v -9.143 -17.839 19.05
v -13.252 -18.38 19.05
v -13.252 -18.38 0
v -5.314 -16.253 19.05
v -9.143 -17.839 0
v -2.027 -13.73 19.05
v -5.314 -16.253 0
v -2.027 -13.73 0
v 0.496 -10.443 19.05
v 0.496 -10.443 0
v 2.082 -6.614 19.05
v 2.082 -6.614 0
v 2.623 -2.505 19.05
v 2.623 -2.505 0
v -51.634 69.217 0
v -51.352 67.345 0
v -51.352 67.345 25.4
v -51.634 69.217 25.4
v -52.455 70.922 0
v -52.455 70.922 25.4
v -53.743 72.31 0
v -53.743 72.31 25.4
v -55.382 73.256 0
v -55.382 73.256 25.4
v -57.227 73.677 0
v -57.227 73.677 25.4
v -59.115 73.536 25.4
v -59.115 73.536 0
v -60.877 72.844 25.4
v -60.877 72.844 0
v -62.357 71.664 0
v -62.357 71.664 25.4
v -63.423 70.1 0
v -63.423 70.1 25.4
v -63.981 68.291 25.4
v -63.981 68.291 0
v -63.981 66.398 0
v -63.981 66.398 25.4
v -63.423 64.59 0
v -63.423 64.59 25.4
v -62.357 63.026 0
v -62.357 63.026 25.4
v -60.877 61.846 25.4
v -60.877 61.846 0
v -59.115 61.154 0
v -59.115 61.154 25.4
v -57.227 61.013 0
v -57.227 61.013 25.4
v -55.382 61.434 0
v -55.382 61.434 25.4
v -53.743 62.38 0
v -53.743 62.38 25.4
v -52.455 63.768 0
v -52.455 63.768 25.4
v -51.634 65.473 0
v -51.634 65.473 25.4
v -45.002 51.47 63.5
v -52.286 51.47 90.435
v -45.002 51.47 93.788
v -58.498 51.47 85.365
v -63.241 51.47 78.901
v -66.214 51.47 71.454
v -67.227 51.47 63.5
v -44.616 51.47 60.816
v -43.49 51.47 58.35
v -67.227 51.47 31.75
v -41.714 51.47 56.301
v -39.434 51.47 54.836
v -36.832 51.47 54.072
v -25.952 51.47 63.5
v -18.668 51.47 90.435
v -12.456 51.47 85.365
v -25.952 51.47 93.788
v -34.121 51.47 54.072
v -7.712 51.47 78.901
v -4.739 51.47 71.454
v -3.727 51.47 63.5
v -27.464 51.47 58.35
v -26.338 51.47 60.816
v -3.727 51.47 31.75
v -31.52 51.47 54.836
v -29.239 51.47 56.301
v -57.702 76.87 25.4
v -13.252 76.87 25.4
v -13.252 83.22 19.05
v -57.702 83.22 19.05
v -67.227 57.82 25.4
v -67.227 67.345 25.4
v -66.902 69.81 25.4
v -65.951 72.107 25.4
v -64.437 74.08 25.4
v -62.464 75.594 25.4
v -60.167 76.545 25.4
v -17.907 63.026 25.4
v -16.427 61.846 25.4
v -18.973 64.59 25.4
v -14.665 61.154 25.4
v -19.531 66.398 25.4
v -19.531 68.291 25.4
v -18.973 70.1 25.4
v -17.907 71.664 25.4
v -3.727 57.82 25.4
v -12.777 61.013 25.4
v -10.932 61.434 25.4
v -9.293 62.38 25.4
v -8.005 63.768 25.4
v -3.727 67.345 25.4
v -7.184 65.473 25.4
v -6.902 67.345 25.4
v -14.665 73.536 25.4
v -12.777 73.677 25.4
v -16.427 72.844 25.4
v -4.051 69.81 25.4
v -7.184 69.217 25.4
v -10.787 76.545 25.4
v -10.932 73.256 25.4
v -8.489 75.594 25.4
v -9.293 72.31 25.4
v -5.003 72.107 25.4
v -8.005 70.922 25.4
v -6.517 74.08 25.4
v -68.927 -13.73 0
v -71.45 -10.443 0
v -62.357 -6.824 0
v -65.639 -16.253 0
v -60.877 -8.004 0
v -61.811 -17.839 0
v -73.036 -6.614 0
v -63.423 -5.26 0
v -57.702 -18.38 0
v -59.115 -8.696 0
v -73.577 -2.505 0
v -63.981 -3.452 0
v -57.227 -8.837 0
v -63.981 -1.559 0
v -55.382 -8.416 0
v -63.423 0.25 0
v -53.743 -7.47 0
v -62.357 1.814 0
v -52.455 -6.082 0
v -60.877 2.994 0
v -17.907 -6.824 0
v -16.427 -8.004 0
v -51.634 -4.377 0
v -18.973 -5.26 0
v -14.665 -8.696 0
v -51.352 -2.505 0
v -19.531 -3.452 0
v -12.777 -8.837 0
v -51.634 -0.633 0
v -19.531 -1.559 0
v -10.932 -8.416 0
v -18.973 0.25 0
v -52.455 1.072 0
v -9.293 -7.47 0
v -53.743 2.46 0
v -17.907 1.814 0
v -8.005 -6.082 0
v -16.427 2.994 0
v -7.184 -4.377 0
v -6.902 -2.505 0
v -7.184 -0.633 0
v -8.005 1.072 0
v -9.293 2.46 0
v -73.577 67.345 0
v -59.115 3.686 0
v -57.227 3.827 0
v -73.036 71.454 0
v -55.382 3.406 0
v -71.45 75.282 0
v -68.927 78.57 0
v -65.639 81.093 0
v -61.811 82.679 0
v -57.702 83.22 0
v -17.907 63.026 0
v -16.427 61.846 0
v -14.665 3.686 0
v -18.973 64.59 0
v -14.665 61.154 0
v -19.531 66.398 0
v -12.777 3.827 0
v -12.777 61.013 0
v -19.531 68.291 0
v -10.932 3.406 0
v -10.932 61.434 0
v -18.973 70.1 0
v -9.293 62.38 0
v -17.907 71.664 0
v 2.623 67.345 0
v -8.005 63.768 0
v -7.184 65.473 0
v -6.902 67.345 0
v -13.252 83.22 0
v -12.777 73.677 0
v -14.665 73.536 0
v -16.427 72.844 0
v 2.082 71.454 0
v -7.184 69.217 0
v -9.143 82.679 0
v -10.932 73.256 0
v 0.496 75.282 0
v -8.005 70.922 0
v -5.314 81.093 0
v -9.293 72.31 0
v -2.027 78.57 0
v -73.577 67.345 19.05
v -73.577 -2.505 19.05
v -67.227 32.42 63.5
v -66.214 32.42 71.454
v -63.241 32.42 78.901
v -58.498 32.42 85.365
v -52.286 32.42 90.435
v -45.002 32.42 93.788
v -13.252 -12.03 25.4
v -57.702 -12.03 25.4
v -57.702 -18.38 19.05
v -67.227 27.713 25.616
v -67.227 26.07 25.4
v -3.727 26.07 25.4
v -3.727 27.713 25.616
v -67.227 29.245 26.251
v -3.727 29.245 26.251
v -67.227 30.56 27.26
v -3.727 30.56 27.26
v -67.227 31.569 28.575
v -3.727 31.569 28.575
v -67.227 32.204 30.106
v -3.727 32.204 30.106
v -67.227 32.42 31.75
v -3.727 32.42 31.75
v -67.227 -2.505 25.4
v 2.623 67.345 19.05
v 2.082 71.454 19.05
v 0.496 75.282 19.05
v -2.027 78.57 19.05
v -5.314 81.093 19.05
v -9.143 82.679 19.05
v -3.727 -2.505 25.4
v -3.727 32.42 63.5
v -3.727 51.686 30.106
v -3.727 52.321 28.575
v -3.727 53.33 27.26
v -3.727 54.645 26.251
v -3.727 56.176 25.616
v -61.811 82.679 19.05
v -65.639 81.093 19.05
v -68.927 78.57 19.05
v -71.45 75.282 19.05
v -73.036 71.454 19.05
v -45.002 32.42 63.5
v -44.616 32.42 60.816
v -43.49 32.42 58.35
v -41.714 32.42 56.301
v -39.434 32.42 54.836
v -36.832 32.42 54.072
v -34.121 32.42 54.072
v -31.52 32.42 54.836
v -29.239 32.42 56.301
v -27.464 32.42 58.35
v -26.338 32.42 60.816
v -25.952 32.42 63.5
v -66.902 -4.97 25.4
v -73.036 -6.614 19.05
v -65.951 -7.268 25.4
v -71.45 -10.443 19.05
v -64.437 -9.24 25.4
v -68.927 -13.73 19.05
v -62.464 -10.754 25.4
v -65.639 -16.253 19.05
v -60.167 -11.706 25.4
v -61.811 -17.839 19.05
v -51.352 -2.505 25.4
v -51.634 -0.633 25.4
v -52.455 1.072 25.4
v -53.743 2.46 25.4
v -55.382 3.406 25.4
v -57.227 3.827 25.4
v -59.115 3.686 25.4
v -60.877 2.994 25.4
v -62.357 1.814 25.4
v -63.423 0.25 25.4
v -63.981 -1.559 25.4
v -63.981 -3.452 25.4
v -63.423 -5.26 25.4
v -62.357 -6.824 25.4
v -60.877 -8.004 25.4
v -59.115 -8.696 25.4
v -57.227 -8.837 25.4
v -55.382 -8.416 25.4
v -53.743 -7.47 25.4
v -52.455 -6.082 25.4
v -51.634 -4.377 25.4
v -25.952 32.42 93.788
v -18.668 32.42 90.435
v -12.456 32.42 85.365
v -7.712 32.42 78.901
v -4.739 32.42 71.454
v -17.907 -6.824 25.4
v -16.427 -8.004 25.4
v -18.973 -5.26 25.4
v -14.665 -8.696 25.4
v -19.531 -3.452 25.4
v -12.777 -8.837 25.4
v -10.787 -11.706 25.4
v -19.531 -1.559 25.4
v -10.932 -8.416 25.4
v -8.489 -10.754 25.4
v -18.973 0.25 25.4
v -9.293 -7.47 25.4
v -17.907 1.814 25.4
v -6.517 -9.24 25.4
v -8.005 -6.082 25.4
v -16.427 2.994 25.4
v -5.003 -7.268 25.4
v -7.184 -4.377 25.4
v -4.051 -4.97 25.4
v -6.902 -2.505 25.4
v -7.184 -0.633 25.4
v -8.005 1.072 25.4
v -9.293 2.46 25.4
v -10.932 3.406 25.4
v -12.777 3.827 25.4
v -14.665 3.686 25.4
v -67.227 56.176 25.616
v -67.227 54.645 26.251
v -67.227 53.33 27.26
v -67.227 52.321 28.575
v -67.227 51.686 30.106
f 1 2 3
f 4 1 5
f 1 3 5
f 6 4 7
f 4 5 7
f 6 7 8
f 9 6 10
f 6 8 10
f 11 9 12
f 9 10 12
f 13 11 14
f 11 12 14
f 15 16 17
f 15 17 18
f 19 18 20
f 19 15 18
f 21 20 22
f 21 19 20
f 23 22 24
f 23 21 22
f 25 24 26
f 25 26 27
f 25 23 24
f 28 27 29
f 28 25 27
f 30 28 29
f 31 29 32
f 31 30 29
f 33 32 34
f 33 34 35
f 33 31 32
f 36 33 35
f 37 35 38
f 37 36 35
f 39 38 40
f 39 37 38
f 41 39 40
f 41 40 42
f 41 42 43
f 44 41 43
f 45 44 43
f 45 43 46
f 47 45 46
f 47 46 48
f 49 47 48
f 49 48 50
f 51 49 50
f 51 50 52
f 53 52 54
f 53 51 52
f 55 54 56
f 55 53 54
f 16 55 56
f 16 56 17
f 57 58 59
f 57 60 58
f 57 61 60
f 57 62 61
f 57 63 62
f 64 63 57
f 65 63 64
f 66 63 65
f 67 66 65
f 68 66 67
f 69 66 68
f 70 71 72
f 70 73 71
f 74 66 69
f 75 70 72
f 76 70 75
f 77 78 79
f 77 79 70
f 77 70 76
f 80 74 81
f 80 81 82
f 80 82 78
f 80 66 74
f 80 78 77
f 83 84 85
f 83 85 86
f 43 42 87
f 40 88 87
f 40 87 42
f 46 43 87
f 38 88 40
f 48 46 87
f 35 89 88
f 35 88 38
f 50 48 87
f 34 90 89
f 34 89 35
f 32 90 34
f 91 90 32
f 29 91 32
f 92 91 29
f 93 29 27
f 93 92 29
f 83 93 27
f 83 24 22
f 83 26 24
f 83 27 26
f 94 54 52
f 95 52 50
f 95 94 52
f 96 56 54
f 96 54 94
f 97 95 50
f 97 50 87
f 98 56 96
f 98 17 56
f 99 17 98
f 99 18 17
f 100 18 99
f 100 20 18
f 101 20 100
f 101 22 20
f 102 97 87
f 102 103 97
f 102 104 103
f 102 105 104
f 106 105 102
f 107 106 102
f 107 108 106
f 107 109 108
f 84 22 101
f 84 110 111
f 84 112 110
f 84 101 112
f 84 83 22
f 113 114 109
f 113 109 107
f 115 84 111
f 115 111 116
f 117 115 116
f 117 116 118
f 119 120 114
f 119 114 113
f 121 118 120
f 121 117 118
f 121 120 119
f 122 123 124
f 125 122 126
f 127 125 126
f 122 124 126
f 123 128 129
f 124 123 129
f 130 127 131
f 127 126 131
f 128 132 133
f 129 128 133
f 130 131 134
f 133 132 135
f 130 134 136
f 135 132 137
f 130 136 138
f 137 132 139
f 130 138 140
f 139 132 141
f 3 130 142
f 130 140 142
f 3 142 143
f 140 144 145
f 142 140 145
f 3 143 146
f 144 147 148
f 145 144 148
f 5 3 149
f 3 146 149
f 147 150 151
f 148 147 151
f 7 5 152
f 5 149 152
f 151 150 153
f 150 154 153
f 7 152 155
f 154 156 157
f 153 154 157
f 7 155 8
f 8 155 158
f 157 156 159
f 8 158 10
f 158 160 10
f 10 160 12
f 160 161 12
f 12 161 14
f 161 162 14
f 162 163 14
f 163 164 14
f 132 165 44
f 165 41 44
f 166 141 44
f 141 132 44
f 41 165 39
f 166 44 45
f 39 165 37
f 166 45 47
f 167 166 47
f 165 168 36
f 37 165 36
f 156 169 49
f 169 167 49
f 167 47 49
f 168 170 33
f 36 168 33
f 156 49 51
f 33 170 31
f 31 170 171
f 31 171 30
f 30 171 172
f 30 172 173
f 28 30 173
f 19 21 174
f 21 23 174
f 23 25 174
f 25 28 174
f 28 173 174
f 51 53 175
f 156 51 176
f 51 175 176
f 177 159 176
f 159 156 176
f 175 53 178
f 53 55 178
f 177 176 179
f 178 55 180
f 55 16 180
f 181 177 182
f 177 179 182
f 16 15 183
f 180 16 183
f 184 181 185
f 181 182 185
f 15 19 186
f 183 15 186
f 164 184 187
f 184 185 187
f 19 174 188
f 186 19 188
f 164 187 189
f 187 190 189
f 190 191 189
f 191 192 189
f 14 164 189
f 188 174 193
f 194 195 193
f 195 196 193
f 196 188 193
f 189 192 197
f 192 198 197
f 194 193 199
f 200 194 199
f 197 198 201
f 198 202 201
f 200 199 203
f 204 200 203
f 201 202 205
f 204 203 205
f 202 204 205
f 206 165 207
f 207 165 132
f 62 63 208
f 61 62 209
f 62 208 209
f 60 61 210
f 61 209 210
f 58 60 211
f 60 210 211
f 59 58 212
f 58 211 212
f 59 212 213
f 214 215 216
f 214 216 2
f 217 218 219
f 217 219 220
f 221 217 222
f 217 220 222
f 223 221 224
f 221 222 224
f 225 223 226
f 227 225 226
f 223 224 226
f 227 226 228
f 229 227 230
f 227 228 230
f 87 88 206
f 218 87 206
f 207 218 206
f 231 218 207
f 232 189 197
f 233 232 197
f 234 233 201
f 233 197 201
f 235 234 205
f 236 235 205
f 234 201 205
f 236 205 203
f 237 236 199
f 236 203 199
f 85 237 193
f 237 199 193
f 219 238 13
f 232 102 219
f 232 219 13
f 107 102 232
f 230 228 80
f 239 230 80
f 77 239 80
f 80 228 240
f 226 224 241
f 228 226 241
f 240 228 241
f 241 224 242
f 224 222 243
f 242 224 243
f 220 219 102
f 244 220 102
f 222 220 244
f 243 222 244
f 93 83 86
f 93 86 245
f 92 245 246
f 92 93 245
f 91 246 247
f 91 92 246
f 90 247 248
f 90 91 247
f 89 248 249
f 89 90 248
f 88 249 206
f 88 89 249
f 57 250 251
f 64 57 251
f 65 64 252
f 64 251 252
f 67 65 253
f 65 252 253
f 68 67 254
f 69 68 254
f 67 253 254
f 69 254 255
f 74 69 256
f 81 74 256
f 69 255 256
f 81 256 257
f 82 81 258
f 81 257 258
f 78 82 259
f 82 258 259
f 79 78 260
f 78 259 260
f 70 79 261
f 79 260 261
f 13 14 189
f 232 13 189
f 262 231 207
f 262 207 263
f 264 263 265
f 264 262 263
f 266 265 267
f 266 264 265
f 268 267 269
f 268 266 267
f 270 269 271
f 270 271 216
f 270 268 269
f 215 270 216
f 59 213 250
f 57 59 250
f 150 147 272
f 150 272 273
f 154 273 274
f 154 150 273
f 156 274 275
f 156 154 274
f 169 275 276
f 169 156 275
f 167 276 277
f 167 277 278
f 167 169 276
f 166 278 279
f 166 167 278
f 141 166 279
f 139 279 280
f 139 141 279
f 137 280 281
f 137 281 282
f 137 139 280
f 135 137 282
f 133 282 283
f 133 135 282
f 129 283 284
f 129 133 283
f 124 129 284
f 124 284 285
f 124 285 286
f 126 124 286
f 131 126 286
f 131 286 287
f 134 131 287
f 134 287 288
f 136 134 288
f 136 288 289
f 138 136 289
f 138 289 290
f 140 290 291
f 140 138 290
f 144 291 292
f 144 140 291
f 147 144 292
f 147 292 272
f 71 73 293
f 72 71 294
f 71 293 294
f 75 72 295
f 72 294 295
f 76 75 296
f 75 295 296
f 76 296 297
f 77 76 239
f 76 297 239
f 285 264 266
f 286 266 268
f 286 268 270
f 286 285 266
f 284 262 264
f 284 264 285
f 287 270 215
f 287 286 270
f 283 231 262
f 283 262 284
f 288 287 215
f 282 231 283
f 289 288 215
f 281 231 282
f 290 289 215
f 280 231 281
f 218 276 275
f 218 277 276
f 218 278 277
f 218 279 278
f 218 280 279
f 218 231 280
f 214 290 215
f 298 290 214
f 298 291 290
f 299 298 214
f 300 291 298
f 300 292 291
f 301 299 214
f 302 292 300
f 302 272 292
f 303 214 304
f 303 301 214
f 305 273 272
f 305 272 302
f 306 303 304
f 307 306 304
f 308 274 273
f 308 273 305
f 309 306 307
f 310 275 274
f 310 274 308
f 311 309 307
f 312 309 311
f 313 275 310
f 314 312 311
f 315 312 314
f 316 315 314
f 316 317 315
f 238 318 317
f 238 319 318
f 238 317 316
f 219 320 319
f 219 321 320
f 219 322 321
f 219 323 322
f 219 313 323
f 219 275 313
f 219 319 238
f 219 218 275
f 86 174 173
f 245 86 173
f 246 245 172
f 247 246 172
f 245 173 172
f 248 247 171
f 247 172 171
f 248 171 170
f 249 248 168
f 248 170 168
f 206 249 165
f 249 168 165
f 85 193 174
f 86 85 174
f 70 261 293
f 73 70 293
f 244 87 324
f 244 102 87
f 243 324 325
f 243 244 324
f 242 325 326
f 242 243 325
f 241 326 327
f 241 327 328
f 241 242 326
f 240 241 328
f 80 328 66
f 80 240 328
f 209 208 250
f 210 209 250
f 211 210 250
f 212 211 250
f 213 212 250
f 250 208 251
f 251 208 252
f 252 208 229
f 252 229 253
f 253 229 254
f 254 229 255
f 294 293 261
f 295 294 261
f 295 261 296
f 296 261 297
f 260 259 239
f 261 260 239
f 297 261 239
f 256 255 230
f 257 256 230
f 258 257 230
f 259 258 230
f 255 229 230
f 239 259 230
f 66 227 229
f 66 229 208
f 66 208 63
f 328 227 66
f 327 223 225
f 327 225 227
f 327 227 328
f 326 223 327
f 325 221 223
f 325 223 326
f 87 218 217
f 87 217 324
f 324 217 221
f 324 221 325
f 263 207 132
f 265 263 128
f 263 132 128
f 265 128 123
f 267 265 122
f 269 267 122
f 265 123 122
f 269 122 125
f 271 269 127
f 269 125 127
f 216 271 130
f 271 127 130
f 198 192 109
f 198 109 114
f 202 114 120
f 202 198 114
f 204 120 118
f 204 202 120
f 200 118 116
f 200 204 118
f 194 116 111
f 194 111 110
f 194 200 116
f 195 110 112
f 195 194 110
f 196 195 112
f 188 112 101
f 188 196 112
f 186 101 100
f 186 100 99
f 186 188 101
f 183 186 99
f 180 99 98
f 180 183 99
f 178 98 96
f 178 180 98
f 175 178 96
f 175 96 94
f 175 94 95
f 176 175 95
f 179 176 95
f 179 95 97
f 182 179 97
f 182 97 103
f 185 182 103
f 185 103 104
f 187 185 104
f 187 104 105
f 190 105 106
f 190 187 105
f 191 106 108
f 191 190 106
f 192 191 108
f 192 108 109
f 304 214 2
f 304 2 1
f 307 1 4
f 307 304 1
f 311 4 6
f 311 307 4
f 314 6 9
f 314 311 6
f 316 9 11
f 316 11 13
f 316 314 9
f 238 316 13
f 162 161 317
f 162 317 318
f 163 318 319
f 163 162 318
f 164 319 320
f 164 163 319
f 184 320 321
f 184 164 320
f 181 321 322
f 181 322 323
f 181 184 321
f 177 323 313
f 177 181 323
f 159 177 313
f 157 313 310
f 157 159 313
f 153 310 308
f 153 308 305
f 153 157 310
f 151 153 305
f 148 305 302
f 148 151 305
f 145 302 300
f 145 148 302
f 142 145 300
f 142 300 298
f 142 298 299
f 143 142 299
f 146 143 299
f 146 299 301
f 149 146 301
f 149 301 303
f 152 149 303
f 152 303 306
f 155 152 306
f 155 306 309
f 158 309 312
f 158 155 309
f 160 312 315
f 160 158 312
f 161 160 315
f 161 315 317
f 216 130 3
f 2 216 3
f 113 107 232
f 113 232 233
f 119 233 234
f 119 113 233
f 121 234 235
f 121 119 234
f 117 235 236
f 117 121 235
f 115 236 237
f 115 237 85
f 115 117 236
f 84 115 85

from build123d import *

# Parameters (mm, degrees)
F0_R     = 6.35
F1_DEPTH = 25.4
F2_SIZE  = 6.35
F3_W     = 63.5
F3_H     = 19.05
F4_DEPTH = 95.25
F6_DEPTH = 25.4
F7_R     = 6.35


with BuildPart() as f1:
    # F0 (on Top) → F1 (new body)
    with BuildSketch(Plane.XY):
        with BuildLine():
            Line((-13.251837, 83.219877), (-57.701837, 83.219877))
            ThreePointArc((-57.701837, 83.219877), (-68.927157, 78.570197), (-73.576837, 67.344877))
            Line((-73.576837, 67.344877), (-73.576837, 51.469877))
            Line((-73.576837, 51.469877), (2.623163, 51.469877))
            Line((2.623163, 51.469877), (2.623163, 67.344877))
            ThreePointArc((2.623163, 67.344877), (-2.026517, 78.570197), (-13.251837, 83.219877))
        make_face()
        with Locations((-57.701837, 67.344877)):
            Circle(F0_R, mode=Mode.SUBTRACT)
        with Locations((-13.251837, 67.344877)):
            Circle(F0_R, mode=Mode.SUBTRACT)
        Polygon((2.623163, 51.469877), (-73.576837, 51.469877), (-73.576837, 50.740071), (-73.576837, 32.419877), (2.623163, 32.419877), align=None)
        with BuildLine():
            Line((2.623163, -2.505123), (2.623163, 32.419877))
            Line((2.623163, 32.419877), (-73.576837, 32.419877))
            Line((-73.576837, 32.419877), (-73.576837, -2.505123))
            ThreePointArc((-73.576837, -2.505123), (-68.927157, -13.730443), (-57.701837, -18.380123))
            Line((-57.701837, -18.380123), (-13.251837, -18.380123))
            ThreePointArc((-13.251837, -18.380123), (-2.026517, -13.730443), (2.623163, -2.505123))
        make_face()
        with Locations((-57.701837, -2.505123)):
            Circle(F0_R, mode=Mode.SUBTRACT)
        with Locations((-13.251837, -2.505123)):
            Circle(F0_R, mode=Mode.SUBTRACT)
    extrude(amount=F1_DEPTH)

    # F2
    f2_edges = [f1.edges().sort_by_distance(p)[0] for p in [
        (-35.476837, 83.219877, 25.4),
    ]]
    chamfer(f2_edges, length=F2_SIZE)

    # F3 (on face) → F4 (join)
    with BuildSketch(Plane.XY.offset(25.4)):
        with Locations((-35.476837, 41.944877)):
            Rectangle(F3_W, F3_H)
    extrude(amount=F4_DEPTH)

    # F5 (on face) → F6 (cut)
    with BuildSketch(Plane.XZ.offset(-32.419877)):
        with BuildLine():
            ThreePointArc((-45.001837, 93.78757), (-35.476837, 95.25), (-25.951837, 93.78757))
            ThreePointArc((-25.951837, 93.78757), (-9.879169, 82.283553), (-3.726837, 63.5))
            Line((-3.726837, 63.5), (-3.726837, 120.65))
            Line((-3.726837, 120.65), (-67.226837, 120.65))
            Line((-67.226837, 120.65), (-67.226837, 63.5))
            ThreePointArc((-67.226837, 63.5), (-61.074506, 82.283553), (-45.001837, 93.78757))
        make_face()
        with BuildLine():
            ThreePointArc((-45.001837, 63.5), (-35.476837, 73.025), (-25.951837, 63.5))
            Line((-25.951837, 63.5), (-25.951837, 93.78757))
            ThreePointArc((-25.951837, 93.78757), (-35.476837, 95.25), (-45.001837, 93.78757))
            Line((-45.001837, 93.78757), (-45.001837, 63.5))
        make_face()
        with BuildLine():
            ThreePointArc((-45.001837, 63.5), (-35.476837, 53.975), (-25.951837, 63.5))
            ThreePointArc((-25.951837, 63.5), (-35.476837, 73.025), (-45.001837, 63.5))
        make_face()
    extrude(amount=-F6_DEPTH, mode=Mode.SUBTRACT)

    # F7
    f7_edges = [f1.edges().sort_by_distance(p)[0] for p in [
        (-35.476837, 51.469877, 25.4),
        (-35.476837, 32.419877, 25.4),
    ]]
    fillet(f7_edges, radius=F7_R)


solid = f1.part
